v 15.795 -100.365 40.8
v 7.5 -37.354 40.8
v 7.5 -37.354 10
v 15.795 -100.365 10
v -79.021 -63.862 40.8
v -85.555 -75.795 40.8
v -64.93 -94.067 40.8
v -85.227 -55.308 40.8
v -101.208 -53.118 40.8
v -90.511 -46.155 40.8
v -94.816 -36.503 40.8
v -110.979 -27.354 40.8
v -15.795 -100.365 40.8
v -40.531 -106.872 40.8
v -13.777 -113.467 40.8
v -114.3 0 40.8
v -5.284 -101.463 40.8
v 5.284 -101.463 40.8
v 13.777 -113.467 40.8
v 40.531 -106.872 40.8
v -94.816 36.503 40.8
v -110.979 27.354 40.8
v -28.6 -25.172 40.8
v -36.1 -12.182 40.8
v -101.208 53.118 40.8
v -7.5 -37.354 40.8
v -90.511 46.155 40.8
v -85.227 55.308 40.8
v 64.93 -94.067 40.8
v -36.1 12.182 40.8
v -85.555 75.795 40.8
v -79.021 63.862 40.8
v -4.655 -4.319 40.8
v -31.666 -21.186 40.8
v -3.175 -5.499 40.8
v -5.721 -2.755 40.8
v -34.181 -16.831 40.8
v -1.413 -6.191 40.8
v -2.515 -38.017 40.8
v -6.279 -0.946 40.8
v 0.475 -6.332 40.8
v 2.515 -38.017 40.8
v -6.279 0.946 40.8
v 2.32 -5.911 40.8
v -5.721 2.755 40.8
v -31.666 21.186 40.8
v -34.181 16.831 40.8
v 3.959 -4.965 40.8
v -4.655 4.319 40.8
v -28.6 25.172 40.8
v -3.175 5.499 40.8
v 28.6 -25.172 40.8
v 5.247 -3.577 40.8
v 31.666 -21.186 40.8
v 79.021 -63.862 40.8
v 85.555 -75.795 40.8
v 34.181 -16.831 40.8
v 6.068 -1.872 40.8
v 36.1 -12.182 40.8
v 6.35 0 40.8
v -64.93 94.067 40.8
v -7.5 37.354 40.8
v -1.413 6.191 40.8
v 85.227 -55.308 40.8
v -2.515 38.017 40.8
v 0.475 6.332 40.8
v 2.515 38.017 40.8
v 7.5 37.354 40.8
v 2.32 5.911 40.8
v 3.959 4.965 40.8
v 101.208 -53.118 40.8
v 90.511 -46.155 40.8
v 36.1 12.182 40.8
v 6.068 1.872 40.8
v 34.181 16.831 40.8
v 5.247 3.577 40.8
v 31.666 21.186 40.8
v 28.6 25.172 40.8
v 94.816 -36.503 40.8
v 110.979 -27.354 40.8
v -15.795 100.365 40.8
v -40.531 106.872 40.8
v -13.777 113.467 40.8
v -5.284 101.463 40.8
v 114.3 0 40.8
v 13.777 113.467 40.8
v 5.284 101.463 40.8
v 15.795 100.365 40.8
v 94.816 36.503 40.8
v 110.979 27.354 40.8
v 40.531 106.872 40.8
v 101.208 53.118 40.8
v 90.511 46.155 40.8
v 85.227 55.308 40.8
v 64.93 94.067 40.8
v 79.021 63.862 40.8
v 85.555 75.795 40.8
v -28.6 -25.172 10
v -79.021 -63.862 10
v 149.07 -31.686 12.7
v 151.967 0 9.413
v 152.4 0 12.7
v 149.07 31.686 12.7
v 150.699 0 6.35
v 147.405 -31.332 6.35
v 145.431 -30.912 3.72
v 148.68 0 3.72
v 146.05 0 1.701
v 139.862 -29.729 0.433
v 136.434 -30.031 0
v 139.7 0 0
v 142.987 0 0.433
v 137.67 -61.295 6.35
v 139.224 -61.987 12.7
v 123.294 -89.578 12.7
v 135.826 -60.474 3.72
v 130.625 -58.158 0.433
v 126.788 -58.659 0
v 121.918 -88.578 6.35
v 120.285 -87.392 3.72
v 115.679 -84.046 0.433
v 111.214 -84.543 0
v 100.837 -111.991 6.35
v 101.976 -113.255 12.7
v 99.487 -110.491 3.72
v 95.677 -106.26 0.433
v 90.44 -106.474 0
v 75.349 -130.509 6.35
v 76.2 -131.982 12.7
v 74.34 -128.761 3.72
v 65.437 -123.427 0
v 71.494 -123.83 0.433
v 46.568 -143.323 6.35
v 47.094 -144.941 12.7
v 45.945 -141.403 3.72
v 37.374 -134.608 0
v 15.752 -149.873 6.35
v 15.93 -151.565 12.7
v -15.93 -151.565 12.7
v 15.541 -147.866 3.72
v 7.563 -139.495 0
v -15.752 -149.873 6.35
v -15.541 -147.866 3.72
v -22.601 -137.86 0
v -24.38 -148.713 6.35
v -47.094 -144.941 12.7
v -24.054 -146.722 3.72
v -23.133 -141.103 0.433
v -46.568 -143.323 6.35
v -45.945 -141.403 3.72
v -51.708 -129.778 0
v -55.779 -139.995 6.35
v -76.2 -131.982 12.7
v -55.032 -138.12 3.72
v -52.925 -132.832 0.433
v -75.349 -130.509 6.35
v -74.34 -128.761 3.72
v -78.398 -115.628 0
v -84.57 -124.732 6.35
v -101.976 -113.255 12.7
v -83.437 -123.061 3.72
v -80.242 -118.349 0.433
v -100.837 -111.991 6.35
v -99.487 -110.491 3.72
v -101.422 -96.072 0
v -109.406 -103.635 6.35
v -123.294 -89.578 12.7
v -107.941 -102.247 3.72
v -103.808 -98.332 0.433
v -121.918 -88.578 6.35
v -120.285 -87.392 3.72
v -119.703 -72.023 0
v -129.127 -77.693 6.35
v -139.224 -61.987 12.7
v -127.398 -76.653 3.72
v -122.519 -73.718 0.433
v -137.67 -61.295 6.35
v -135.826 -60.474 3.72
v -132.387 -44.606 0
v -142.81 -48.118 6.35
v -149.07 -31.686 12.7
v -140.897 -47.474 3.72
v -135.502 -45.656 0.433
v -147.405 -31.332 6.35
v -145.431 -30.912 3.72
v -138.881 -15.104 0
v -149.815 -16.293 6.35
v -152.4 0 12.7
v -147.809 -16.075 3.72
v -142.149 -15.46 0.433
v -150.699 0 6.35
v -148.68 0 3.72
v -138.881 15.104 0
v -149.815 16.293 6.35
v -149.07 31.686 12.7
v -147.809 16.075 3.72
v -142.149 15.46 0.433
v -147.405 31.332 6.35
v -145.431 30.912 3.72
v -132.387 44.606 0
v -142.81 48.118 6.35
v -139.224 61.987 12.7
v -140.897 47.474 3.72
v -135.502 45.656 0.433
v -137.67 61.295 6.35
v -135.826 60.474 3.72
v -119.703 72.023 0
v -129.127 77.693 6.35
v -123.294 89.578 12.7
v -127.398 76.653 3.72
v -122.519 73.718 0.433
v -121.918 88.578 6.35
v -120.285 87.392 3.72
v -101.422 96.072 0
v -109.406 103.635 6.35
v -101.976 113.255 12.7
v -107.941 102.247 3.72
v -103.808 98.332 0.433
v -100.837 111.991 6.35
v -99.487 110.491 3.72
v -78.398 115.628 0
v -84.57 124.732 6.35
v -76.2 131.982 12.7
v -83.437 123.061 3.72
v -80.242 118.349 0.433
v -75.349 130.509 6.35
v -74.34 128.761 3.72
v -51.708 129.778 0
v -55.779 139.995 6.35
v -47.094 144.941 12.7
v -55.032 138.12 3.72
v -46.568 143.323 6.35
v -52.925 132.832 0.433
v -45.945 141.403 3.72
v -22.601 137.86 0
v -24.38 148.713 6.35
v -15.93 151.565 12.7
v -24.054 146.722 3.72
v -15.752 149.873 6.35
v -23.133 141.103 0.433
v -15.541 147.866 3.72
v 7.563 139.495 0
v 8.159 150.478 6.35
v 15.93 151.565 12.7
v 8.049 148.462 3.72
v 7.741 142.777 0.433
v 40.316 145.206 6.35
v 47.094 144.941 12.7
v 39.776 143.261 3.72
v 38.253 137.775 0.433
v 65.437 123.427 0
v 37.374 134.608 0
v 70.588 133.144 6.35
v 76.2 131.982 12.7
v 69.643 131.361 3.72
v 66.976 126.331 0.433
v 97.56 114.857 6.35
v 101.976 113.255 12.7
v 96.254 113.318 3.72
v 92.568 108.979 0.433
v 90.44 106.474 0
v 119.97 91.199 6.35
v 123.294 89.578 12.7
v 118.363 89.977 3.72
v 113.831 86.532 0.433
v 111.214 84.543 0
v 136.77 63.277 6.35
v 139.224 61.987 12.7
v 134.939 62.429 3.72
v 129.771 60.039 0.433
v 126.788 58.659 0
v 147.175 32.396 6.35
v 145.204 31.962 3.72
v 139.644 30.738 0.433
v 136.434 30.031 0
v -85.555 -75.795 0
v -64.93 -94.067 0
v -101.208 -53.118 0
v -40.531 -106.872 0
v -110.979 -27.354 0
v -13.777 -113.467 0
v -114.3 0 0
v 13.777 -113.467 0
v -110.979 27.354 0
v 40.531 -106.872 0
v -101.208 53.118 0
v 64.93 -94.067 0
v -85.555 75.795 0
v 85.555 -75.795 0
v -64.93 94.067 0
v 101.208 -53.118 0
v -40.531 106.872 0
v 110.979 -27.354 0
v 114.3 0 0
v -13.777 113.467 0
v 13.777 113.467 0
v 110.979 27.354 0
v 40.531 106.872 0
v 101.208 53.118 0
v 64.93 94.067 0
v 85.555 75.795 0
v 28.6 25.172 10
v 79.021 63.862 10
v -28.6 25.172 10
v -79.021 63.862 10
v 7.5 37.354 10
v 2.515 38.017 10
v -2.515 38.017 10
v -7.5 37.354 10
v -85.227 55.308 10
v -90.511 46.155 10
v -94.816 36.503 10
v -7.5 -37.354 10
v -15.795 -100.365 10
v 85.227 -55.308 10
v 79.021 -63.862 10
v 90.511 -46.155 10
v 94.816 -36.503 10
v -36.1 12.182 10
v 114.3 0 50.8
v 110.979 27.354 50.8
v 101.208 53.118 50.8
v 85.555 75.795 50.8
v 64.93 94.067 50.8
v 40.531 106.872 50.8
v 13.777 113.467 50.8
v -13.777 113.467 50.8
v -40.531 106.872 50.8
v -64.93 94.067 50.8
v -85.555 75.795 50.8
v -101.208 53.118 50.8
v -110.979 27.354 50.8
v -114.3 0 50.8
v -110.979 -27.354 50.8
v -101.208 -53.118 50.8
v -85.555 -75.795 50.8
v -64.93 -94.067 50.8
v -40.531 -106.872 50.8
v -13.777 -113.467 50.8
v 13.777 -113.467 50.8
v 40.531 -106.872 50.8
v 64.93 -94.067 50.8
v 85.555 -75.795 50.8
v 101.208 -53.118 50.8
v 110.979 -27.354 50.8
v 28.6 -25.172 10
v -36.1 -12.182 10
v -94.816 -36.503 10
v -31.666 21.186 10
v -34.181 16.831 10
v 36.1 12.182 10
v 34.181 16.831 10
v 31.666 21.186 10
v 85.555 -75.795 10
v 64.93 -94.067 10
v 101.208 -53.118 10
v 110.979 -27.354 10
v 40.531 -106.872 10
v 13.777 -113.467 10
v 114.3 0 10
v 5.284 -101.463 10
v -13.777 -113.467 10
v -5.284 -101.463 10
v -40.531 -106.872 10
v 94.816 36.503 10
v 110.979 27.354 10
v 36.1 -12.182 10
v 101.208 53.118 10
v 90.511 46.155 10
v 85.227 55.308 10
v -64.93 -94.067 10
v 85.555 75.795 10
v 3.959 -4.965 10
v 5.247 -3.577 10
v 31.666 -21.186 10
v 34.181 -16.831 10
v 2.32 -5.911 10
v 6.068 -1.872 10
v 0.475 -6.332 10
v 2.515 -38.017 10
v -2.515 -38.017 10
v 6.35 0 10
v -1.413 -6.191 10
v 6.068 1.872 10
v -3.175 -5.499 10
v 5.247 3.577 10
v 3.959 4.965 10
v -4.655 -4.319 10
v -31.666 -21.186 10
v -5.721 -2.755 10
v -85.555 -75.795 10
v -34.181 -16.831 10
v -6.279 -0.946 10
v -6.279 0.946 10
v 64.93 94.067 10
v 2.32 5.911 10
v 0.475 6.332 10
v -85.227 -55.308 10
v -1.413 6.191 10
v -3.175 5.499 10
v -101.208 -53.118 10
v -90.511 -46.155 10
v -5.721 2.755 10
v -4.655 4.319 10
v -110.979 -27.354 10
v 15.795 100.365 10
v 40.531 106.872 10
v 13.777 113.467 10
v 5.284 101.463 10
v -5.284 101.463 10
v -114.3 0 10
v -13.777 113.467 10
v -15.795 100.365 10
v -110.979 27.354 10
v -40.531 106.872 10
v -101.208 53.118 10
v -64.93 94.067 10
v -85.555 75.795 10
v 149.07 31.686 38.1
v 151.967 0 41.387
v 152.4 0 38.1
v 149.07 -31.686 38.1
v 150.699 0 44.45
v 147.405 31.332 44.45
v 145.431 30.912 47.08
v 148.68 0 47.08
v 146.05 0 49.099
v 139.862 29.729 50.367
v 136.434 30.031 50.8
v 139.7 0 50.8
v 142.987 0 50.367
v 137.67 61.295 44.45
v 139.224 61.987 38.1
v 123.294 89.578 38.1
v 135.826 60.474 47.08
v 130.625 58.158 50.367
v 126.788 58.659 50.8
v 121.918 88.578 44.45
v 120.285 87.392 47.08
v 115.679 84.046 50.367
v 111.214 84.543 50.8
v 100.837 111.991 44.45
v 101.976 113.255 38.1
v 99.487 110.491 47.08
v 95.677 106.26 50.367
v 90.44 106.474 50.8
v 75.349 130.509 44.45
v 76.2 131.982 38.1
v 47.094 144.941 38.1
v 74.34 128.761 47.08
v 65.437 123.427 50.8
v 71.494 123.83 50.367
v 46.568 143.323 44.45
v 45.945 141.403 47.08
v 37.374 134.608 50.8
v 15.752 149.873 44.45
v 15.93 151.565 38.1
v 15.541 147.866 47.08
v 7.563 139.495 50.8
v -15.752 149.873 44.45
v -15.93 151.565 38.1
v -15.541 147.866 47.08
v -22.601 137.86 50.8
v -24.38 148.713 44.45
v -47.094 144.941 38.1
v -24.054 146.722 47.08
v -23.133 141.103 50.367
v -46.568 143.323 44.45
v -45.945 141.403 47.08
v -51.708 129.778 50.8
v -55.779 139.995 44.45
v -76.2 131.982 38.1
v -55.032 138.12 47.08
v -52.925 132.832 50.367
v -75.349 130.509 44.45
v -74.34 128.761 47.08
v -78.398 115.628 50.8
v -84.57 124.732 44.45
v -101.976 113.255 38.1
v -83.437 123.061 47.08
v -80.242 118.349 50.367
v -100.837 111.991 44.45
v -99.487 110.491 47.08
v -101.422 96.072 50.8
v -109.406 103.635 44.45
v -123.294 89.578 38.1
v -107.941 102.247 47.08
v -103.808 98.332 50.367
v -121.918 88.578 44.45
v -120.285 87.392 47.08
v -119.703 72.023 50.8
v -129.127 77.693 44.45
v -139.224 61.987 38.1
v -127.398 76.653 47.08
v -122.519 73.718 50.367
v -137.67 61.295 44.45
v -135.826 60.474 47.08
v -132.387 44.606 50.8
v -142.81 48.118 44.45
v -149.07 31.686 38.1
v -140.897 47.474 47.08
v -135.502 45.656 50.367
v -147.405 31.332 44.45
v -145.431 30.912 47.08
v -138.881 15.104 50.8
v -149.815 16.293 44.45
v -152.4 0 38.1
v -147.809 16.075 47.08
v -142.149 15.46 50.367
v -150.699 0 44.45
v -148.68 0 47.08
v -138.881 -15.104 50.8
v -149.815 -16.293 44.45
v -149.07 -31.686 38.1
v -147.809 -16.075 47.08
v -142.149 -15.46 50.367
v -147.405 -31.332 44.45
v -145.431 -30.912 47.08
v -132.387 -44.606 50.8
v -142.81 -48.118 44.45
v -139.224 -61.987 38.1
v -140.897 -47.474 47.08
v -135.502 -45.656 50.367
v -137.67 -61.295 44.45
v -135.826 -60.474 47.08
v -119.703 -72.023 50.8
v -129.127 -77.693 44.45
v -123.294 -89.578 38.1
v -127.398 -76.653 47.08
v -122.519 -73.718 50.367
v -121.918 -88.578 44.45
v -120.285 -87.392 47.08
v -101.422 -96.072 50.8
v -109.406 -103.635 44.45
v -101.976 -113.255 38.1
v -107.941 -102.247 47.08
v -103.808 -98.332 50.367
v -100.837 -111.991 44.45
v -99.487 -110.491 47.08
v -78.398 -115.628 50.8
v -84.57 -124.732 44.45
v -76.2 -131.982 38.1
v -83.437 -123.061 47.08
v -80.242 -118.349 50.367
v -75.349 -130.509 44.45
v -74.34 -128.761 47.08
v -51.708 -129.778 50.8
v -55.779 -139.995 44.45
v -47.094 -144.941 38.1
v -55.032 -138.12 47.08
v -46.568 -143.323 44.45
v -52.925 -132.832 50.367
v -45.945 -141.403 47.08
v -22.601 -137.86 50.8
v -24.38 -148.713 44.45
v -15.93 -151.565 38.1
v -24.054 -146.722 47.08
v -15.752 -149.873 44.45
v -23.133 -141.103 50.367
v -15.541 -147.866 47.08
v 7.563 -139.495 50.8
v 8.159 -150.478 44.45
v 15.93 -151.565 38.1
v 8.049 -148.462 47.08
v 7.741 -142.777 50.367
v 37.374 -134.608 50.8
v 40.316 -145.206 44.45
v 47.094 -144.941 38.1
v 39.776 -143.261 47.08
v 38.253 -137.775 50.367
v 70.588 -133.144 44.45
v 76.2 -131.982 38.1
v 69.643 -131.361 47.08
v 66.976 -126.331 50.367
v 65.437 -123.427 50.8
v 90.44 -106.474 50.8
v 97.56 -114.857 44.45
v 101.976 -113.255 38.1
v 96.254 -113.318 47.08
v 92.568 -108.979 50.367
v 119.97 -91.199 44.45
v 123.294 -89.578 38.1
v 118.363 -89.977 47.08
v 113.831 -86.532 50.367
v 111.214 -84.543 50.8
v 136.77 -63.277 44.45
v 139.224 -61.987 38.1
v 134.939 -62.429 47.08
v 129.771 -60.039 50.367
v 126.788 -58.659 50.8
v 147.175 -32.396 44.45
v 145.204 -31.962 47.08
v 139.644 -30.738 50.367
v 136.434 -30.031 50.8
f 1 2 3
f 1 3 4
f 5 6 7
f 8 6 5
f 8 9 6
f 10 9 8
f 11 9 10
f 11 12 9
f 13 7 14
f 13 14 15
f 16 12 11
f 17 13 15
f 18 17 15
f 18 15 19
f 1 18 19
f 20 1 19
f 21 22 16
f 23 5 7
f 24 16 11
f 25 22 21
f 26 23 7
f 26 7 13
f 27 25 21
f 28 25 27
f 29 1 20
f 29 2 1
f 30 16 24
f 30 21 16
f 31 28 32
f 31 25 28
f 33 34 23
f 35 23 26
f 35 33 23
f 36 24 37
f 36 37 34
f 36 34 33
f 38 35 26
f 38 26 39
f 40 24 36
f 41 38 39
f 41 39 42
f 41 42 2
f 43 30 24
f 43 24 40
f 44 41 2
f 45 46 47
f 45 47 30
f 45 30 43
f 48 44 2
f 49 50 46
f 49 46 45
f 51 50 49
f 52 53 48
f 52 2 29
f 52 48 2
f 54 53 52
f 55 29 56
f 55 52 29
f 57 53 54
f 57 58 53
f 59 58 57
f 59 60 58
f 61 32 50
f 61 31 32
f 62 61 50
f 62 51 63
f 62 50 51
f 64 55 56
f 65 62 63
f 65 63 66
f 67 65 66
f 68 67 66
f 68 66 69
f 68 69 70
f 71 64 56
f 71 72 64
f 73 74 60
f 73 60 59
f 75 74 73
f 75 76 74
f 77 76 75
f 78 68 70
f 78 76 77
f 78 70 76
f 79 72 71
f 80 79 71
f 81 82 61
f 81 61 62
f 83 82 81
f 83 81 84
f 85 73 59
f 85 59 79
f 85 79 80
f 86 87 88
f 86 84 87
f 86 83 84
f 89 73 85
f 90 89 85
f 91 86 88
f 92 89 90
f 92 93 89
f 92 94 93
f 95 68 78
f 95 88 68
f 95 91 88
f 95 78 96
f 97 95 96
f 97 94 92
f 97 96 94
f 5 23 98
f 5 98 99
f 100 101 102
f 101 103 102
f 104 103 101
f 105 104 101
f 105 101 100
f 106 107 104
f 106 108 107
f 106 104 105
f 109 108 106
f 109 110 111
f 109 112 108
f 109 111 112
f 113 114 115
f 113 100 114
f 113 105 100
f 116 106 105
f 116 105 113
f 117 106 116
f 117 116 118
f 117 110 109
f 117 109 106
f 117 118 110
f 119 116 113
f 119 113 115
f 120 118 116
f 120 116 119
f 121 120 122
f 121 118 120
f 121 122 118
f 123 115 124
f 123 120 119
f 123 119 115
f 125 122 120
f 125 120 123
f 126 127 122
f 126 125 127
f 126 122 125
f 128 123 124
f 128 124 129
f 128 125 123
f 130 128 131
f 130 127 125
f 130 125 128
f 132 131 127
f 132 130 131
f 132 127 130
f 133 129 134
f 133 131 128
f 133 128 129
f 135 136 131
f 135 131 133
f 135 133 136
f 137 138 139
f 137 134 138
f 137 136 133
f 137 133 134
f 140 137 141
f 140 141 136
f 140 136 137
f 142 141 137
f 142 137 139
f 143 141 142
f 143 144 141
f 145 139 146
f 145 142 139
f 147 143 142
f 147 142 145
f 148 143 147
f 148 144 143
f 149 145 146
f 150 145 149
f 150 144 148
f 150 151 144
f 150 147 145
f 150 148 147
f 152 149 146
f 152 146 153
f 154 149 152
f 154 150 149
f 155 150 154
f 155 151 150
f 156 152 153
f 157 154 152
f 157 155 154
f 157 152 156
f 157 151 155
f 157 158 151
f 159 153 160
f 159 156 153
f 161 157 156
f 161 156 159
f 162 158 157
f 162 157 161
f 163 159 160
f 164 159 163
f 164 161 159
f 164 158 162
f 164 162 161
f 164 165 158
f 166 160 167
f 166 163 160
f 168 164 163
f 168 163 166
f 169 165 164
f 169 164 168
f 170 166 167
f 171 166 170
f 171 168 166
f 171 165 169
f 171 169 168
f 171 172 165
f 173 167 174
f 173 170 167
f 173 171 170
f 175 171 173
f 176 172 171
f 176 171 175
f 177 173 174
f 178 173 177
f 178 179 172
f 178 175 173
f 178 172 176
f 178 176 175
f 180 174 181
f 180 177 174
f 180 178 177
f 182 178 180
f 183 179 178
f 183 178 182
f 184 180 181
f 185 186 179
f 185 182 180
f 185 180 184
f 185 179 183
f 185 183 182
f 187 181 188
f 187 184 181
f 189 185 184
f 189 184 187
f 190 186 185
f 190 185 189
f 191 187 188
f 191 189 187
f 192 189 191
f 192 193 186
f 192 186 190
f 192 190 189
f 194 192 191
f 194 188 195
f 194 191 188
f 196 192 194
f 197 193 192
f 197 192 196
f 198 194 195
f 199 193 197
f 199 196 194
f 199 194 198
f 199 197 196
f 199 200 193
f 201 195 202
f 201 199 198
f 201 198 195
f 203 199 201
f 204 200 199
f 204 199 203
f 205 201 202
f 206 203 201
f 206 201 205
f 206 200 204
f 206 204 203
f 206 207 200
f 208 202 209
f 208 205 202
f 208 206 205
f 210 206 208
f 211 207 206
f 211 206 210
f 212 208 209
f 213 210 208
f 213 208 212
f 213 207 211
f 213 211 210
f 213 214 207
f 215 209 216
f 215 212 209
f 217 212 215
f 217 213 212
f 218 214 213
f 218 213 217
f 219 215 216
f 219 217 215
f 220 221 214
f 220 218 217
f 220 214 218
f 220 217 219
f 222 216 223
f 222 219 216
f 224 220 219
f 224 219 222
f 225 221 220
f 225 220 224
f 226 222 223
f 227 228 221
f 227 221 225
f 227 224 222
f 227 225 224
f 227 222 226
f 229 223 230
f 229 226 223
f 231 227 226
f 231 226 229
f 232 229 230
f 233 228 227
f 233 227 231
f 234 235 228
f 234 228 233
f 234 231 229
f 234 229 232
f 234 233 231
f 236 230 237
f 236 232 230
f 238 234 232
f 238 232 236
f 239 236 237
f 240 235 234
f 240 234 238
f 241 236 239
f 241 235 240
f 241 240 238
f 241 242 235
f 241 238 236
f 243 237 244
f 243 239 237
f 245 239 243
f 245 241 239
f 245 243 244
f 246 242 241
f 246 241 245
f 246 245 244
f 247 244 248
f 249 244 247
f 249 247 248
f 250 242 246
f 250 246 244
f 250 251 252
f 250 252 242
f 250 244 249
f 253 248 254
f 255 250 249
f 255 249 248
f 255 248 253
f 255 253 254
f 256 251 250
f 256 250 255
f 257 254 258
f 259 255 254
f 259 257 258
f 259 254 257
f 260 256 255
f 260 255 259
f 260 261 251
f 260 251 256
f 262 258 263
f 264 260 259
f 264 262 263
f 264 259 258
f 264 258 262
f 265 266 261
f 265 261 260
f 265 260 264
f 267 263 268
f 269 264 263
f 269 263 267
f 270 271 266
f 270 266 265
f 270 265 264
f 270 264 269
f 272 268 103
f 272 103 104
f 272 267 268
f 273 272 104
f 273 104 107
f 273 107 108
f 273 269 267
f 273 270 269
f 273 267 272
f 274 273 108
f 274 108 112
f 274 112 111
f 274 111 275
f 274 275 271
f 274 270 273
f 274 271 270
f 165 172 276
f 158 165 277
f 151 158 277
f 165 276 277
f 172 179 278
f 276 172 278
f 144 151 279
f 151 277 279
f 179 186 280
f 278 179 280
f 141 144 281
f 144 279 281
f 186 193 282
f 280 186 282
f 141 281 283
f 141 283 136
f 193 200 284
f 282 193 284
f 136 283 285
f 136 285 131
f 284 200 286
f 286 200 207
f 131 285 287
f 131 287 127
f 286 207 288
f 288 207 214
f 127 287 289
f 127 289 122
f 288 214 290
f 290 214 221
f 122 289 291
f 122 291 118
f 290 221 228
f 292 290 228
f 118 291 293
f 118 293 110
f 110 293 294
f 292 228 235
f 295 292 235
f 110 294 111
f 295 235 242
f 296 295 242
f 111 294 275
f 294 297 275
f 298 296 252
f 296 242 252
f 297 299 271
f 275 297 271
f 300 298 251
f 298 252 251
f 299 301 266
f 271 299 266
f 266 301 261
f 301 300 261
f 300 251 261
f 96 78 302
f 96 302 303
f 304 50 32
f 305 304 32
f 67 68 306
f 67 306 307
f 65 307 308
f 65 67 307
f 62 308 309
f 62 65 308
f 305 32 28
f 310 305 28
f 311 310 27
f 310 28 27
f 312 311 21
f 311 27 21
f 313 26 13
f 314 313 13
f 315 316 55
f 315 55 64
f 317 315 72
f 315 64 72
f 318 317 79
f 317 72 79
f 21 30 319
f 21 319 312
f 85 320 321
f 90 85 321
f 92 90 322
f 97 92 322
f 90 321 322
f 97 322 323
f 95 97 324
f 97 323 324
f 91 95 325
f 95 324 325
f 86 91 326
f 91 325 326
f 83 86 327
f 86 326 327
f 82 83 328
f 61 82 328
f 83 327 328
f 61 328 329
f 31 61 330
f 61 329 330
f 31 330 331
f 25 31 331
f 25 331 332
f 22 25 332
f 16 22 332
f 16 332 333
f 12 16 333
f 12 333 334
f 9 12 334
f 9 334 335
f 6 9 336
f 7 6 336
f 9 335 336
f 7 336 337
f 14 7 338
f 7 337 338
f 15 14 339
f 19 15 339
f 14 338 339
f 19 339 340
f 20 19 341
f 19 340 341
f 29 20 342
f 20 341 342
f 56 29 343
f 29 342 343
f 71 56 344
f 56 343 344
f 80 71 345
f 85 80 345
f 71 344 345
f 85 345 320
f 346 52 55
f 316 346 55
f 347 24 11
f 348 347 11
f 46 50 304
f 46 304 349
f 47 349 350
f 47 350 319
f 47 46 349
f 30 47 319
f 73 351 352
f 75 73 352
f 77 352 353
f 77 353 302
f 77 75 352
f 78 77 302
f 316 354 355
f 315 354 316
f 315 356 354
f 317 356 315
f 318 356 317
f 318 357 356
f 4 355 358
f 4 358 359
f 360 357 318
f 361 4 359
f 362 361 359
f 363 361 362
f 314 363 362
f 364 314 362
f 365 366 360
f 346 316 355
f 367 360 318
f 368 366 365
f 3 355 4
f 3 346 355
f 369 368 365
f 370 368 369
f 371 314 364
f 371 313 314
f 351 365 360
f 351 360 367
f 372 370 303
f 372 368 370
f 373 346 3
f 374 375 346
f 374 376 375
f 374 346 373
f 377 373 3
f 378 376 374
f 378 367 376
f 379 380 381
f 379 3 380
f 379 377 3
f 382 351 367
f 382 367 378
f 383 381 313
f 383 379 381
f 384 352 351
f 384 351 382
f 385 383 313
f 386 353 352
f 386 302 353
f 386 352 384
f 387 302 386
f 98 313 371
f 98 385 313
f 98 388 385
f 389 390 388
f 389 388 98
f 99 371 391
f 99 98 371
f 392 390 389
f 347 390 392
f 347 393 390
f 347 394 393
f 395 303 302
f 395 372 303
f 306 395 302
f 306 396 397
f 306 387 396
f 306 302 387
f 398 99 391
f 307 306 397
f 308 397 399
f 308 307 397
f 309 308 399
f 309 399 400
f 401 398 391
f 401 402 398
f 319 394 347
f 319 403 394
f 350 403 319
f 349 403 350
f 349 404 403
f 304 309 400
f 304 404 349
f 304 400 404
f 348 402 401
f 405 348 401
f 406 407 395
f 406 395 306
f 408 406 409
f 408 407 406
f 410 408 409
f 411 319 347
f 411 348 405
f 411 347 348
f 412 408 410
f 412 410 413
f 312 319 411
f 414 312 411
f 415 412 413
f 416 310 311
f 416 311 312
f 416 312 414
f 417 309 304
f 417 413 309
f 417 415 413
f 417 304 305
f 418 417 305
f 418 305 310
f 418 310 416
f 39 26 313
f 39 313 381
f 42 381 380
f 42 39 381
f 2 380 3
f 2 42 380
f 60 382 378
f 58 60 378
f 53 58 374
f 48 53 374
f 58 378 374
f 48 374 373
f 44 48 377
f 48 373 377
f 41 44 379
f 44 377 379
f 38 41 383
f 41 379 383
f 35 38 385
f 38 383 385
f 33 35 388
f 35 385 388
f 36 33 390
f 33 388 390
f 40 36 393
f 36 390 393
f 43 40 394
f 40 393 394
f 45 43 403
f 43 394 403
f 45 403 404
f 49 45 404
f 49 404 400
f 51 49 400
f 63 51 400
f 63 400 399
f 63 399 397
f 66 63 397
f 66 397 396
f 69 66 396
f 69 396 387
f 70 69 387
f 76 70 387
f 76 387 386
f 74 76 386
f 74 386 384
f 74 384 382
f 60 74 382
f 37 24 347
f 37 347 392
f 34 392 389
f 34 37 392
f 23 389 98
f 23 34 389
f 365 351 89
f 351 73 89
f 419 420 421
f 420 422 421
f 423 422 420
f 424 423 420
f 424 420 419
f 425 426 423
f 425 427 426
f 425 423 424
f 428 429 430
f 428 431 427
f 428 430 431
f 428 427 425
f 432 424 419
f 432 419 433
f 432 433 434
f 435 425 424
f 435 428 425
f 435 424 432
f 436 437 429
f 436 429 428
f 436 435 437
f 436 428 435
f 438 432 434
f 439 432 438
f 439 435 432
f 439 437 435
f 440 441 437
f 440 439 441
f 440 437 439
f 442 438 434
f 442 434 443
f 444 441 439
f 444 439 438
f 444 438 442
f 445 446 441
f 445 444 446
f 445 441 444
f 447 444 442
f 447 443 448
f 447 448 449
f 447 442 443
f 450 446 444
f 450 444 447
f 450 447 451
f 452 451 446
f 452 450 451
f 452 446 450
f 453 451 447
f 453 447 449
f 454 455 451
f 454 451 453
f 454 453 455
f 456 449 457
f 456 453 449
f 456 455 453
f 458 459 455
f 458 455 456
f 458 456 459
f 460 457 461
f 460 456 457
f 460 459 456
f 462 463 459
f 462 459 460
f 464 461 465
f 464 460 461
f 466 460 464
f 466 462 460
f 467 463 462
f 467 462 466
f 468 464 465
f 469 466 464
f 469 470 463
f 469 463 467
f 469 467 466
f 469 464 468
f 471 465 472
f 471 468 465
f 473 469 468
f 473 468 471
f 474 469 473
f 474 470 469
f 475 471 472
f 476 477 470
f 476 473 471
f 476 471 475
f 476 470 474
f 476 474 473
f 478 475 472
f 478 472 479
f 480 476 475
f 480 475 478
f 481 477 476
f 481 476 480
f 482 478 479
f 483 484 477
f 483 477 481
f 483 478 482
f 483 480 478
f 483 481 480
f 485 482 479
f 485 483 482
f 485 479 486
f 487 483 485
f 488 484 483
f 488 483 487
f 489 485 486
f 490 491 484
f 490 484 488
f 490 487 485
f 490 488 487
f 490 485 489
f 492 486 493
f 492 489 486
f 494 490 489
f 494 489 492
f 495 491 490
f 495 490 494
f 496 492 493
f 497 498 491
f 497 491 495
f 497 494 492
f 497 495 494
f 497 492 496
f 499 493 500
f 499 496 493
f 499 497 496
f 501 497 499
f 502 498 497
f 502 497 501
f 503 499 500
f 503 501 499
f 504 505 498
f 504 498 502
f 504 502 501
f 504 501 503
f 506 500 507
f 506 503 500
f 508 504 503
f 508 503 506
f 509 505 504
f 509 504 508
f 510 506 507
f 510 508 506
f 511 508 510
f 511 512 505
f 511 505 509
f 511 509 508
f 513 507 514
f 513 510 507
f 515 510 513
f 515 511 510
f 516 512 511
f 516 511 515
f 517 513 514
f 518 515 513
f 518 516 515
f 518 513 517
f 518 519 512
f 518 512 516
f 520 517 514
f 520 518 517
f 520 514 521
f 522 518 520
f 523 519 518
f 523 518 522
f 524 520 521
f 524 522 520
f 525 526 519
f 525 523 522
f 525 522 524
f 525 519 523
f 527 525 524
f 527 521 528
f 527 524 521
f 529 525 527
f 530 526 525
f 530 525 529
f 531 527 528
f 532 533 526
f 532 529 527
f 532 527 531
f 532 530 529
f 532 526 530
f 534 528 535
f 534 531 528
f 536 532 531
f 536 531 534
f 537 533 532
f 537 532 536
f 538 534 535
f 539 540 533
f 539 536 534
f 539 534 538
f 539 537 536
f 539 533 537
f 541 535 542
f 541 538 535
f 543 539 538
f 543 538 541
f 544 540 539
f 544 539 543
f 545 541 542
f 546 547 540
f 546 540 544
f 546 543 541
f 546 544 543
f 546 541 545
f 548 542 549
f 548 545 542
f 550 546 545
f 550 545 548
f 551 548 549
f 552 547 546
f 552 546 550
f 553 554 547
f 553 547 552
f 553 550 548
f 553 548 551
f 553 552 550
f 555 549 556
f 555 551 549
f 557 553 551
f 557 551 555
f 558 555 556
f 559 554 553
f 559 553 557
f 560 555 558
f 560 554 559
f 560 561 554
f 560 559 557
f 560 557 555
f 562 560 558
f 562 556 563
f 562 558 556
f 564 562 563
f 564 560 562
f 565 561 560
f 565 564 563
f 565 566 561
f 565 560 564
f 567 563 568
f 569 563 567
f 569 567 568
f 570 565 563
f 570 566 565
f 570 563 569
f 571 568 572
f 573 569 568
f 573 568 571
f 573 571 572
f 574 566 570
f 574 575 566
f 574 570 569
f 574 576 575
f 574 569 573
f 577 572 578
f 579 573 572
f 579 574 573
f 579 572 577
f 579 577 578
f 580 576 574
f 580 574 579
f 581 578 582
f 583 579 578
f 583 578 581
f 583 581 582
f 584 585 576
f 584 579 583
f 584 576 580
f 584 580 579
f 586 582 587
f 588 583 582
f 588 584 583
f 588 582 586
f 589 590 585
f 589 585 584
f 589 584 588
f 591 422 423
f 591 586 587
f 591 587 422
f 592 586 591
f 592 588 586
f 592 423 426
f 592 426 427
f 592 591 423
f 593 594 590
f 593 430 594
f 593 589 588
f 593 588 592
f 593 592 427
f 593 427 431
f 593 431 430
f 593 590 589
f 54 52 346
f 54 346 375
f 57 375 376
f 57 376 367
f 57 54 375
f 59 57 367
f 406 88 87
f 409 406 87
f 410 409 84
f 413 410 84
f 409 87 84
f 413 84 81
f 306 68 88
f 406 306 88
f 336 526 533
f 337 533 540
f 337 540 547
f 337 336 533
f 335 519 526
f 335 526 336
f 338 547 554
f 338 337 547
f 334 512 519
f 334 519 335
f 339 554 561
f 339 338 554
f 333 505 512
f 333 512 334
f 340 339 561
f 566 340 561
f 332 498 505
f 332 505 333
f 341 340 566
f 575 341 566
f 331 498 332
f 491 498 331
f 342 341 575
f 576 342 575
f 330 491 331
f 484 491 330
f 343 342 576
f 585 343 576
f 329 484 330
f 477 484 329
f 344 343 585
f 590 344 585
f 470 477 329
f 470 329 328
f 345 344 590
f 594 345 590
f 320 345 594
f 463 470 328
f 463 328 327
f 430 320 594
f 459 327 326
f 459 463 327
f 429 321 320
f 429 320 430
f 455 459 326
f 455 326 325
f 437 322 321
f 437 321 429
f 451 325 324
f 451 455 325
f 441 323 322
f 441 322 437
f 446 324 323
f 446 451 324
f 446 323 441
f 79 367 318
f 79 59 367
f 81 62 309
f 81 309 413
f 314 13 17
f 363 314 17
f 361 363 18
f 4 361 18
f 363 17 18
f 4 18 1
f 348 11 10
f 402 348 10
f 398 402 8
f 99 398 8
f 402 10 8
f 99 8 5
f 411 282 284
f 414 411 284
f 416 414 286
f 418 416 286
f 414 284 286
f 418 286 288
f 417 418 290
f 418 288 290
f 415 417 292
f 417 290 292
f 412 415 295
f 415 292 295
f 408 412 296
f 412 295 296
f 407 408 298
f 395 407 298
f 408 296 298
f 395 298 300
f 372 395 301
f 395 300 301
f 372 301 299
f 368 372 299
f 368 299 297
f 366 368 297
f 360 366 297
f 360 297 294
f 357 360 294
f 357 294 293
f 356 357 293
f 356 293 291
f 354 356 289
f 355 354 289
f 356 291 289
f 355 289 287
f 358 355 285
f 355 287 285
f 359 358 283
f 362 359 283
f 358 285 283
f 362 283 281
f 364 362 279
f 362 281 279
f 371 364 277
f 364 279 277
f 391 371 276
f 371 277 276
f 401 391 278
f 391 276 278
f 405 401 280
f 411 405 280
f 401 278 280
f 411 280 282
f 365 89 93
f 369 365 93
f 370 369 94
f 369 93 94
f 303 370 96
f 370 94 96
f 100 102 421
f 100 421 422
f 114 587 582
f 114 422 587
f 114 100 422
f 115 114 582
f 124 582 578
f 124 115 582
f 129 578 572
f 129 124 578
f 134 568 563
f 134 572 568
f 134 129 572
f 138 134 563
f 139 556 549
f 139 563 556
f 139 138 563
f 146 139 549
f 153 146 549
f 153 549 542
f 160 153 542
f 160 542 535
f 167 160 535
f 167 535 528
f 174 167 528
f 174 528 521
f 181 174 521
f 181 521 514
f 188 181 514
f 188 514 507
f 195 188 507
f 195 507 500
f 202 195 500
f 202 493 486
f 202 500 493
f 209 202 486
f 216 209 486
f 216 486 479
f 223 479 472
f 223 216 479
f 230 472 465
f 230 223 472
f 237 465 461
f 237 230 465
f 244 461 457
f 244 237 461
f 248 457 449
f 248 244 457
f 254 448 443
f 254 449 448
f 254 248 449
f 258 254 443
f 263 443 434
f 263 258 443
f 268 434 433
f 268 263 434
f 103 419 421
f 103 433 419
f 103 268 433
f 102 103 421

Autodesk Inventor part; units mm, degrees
ref_plane "YZ Plane" through (0, 0, 0) normal (1, 0, 0) x (0, 1, 0)
ref_plane "XZ Plane" through (0, 0, 0) normal (0, 1, 0) x (-1, 0, 0)
ref_plane "XY Plane" through (0, 0, 0) normal (0, 0, 1) x (1, 0, 0)
sketch "Sketch1" plane through (0, 0, 0) normal (0, 0, 1) x (1, 0, 0)
  circle A0 centre (0, 0) radius 152.4
  circle A1 centre (0, 0) radius 6.35
  dimension "d0" = 304.8
  dimension "d1" = 12.7
extrude "Extrusion1" add sketch "Sketch1" along normal blind 50.8
sketch "Sketch2" plane through (0, 0, 50.8) normal (0, 0, 1) x (1, 0, 0)
  circle A0 centre (0, 0) radius 6.35 projected
  circle A1 centre (0, 0) radius 38.1 construction
  circle A2 centre (0, 0) radius 101.6 construction
  line L0 (7.5, -37.3545) -> (15.7954, -100.3647)
  line L1 (-7.5, -37.3545) -> (-15.7954, -100.3647)
  line L2 (7.5, -37.3545) -> (-7.5, -37.3545) construction
  arc A3 (-15.7954, -100.3647) -> (15.7954, -100.3647) centre (0, 0) ccw
  arc A4 (-7.5, -37.3545) -> (7.5, -37.3545) centre (0, 0) ccw
  circle A5 centre (0, 0) radius 38.1 construction
  circle A6 centre (0, 0) radius 101.6 construction
  line L3 (36.1, -12.1821) -> (94.8161, -36.5031)
  line L4 (28.6, -25.1724) -> (79.0206, -63.8616)
  line L5 (36.1, -12.1821) -> (28.6, -25.1724) construction
  arc A7 (79.0206, -63.8616) -> (94.8161, -36.5031) centre (0, 0) ccw
  arc A8 (28.6, -25.1724) -> (36.1, -12.1821) centre (0, 0) ccw
  circle A9 centre (0, 0) radius 38.1 construction
  circle A10 centre (0, 0) radius 101.6 construction
  line L6 (28.6, 25.1724) -> (79.0206, 63.8616)
  line L7 (36.1, 12.1821) -> (94.8161, 36.5031)
  line L8 (28.6, 25.1724) -> (36.1, 12.1821) construction
  arc A11 (94.8161, 36.5031) -> (79.0206, 63.8616) centre (0, 0) ccw
  arc A12 (36.1, 12.1821) -> (28.6, 25.1724) centre (0, 0) ccw
  circle A13 centre (0, 0) radius 38.1 construction
  circle A14 centre (0, 0) radius 101.6 construction
  line L9 (-7.5, 37.3545) -> (-15.7954, 100.3647)
  line L10 (7.5, 37.3545) -> (15.7954, 100.3647)
  line L11 (-7.5, 37.3545) -> (7.5, 37.3545) construction
  arc A15 (15.7954, 100.3647) -> (-15.7954, 100.3647) centre (0, 0) ccw
  arc A16 (7.5, 37.3545) -> (-7.5, 37.3545) centre (0, 0) ccw
  circle A17 centre (0, 0) radius 38.1 construction
  circle A18 centre (0, 0) radius 101.6 construction
  line L12 (-36.1, 12.1821) -> (-94.8161, 36.5031)
  line L13 (-28.6, 25.1724) -> (-79.0206, 63.8616)
  line L14 (-36.1, 12.1821) -> (-28.6, 25.1724) construction
  arc A19 (-79.0206, 63.8616) -> (-94.8161, 36.5031) centre (0, 0) ccw
  arc A20 (-28.6, 25.1724) -> (-36.1, 12.1821) centre (0, 0) ccw
  circle A21 centre (0, 0) radius 38.1 construction
  circle A22 centre (0, 0) radius 101.6 construction
  line L15 (-28.6, -25.1724) -> (-79.0206, -63.8616)
  line L16 (-36.1, -12.1821) -> (-94.8161, -36.5031)
  line L17 (-28.6, -25.1724) -> (-36.1, -12.1821) construction
  arc A23 (-94.8161, -36.5031) -> (-79.0206, -63.8616) centre (0, 0) ccw
  arc A24 (-36.1, -12.1821) -> (-28.6, -25.1724) centre (0, 0) ccw
  point P0 (0, -37.3545)
  point P1 (0, -101.6)
  point P2 (32.35, -18.6773)
  point P3 (87.9882, -50.8)
  point P4 (32.35, 18.6773)
  point P5 (87.9882, 50.8)
  point P6 (0, 37.3545)
  point P7 (0, 101.6)
  point P8 (-32.35, 18.6773)
  point P9 (-87.9882, 50.8)
  point P10 (-32.35, -18.6773)
  point P11 (-87.9882, -50.8)
  dimension "d4" = 15
  dimension "d5" = 15
  dimension "d6" = 76.2
  dimension "d7" = 203.2
  dimension "d10" = 360
extrude "Extrusion2" cut sketch "Sketch2" against normal through all
sketch "Sketch3" plane through (0, 0, 50.8) normal (0, 0, 1) x (1, 0, 0)
  circle A0 centre (0, 0) radius 114.3
  dimension "d14" = 228.6
extrude "Extrusion3" cut sketch "Sketch3" against normal blind 10
sketch "Sketch4" plane through (0, 0, 0) normal (0, 0, -1) x (-1, 0, 0)
  circle A0 centre (0, 0) radius 6.35 projected
  circle A1 centre (0, 0) radius 114.3 projected
extrude "Extrusion4" cut sketch "Sketch4" against normal blind 10 contours A0 | A1
fillet "Fillet1" radius 12.7 2 edges at (-152.4, 0, 0) (-152.4, 0, 50.8)
properties part number "12 in Wheel"
